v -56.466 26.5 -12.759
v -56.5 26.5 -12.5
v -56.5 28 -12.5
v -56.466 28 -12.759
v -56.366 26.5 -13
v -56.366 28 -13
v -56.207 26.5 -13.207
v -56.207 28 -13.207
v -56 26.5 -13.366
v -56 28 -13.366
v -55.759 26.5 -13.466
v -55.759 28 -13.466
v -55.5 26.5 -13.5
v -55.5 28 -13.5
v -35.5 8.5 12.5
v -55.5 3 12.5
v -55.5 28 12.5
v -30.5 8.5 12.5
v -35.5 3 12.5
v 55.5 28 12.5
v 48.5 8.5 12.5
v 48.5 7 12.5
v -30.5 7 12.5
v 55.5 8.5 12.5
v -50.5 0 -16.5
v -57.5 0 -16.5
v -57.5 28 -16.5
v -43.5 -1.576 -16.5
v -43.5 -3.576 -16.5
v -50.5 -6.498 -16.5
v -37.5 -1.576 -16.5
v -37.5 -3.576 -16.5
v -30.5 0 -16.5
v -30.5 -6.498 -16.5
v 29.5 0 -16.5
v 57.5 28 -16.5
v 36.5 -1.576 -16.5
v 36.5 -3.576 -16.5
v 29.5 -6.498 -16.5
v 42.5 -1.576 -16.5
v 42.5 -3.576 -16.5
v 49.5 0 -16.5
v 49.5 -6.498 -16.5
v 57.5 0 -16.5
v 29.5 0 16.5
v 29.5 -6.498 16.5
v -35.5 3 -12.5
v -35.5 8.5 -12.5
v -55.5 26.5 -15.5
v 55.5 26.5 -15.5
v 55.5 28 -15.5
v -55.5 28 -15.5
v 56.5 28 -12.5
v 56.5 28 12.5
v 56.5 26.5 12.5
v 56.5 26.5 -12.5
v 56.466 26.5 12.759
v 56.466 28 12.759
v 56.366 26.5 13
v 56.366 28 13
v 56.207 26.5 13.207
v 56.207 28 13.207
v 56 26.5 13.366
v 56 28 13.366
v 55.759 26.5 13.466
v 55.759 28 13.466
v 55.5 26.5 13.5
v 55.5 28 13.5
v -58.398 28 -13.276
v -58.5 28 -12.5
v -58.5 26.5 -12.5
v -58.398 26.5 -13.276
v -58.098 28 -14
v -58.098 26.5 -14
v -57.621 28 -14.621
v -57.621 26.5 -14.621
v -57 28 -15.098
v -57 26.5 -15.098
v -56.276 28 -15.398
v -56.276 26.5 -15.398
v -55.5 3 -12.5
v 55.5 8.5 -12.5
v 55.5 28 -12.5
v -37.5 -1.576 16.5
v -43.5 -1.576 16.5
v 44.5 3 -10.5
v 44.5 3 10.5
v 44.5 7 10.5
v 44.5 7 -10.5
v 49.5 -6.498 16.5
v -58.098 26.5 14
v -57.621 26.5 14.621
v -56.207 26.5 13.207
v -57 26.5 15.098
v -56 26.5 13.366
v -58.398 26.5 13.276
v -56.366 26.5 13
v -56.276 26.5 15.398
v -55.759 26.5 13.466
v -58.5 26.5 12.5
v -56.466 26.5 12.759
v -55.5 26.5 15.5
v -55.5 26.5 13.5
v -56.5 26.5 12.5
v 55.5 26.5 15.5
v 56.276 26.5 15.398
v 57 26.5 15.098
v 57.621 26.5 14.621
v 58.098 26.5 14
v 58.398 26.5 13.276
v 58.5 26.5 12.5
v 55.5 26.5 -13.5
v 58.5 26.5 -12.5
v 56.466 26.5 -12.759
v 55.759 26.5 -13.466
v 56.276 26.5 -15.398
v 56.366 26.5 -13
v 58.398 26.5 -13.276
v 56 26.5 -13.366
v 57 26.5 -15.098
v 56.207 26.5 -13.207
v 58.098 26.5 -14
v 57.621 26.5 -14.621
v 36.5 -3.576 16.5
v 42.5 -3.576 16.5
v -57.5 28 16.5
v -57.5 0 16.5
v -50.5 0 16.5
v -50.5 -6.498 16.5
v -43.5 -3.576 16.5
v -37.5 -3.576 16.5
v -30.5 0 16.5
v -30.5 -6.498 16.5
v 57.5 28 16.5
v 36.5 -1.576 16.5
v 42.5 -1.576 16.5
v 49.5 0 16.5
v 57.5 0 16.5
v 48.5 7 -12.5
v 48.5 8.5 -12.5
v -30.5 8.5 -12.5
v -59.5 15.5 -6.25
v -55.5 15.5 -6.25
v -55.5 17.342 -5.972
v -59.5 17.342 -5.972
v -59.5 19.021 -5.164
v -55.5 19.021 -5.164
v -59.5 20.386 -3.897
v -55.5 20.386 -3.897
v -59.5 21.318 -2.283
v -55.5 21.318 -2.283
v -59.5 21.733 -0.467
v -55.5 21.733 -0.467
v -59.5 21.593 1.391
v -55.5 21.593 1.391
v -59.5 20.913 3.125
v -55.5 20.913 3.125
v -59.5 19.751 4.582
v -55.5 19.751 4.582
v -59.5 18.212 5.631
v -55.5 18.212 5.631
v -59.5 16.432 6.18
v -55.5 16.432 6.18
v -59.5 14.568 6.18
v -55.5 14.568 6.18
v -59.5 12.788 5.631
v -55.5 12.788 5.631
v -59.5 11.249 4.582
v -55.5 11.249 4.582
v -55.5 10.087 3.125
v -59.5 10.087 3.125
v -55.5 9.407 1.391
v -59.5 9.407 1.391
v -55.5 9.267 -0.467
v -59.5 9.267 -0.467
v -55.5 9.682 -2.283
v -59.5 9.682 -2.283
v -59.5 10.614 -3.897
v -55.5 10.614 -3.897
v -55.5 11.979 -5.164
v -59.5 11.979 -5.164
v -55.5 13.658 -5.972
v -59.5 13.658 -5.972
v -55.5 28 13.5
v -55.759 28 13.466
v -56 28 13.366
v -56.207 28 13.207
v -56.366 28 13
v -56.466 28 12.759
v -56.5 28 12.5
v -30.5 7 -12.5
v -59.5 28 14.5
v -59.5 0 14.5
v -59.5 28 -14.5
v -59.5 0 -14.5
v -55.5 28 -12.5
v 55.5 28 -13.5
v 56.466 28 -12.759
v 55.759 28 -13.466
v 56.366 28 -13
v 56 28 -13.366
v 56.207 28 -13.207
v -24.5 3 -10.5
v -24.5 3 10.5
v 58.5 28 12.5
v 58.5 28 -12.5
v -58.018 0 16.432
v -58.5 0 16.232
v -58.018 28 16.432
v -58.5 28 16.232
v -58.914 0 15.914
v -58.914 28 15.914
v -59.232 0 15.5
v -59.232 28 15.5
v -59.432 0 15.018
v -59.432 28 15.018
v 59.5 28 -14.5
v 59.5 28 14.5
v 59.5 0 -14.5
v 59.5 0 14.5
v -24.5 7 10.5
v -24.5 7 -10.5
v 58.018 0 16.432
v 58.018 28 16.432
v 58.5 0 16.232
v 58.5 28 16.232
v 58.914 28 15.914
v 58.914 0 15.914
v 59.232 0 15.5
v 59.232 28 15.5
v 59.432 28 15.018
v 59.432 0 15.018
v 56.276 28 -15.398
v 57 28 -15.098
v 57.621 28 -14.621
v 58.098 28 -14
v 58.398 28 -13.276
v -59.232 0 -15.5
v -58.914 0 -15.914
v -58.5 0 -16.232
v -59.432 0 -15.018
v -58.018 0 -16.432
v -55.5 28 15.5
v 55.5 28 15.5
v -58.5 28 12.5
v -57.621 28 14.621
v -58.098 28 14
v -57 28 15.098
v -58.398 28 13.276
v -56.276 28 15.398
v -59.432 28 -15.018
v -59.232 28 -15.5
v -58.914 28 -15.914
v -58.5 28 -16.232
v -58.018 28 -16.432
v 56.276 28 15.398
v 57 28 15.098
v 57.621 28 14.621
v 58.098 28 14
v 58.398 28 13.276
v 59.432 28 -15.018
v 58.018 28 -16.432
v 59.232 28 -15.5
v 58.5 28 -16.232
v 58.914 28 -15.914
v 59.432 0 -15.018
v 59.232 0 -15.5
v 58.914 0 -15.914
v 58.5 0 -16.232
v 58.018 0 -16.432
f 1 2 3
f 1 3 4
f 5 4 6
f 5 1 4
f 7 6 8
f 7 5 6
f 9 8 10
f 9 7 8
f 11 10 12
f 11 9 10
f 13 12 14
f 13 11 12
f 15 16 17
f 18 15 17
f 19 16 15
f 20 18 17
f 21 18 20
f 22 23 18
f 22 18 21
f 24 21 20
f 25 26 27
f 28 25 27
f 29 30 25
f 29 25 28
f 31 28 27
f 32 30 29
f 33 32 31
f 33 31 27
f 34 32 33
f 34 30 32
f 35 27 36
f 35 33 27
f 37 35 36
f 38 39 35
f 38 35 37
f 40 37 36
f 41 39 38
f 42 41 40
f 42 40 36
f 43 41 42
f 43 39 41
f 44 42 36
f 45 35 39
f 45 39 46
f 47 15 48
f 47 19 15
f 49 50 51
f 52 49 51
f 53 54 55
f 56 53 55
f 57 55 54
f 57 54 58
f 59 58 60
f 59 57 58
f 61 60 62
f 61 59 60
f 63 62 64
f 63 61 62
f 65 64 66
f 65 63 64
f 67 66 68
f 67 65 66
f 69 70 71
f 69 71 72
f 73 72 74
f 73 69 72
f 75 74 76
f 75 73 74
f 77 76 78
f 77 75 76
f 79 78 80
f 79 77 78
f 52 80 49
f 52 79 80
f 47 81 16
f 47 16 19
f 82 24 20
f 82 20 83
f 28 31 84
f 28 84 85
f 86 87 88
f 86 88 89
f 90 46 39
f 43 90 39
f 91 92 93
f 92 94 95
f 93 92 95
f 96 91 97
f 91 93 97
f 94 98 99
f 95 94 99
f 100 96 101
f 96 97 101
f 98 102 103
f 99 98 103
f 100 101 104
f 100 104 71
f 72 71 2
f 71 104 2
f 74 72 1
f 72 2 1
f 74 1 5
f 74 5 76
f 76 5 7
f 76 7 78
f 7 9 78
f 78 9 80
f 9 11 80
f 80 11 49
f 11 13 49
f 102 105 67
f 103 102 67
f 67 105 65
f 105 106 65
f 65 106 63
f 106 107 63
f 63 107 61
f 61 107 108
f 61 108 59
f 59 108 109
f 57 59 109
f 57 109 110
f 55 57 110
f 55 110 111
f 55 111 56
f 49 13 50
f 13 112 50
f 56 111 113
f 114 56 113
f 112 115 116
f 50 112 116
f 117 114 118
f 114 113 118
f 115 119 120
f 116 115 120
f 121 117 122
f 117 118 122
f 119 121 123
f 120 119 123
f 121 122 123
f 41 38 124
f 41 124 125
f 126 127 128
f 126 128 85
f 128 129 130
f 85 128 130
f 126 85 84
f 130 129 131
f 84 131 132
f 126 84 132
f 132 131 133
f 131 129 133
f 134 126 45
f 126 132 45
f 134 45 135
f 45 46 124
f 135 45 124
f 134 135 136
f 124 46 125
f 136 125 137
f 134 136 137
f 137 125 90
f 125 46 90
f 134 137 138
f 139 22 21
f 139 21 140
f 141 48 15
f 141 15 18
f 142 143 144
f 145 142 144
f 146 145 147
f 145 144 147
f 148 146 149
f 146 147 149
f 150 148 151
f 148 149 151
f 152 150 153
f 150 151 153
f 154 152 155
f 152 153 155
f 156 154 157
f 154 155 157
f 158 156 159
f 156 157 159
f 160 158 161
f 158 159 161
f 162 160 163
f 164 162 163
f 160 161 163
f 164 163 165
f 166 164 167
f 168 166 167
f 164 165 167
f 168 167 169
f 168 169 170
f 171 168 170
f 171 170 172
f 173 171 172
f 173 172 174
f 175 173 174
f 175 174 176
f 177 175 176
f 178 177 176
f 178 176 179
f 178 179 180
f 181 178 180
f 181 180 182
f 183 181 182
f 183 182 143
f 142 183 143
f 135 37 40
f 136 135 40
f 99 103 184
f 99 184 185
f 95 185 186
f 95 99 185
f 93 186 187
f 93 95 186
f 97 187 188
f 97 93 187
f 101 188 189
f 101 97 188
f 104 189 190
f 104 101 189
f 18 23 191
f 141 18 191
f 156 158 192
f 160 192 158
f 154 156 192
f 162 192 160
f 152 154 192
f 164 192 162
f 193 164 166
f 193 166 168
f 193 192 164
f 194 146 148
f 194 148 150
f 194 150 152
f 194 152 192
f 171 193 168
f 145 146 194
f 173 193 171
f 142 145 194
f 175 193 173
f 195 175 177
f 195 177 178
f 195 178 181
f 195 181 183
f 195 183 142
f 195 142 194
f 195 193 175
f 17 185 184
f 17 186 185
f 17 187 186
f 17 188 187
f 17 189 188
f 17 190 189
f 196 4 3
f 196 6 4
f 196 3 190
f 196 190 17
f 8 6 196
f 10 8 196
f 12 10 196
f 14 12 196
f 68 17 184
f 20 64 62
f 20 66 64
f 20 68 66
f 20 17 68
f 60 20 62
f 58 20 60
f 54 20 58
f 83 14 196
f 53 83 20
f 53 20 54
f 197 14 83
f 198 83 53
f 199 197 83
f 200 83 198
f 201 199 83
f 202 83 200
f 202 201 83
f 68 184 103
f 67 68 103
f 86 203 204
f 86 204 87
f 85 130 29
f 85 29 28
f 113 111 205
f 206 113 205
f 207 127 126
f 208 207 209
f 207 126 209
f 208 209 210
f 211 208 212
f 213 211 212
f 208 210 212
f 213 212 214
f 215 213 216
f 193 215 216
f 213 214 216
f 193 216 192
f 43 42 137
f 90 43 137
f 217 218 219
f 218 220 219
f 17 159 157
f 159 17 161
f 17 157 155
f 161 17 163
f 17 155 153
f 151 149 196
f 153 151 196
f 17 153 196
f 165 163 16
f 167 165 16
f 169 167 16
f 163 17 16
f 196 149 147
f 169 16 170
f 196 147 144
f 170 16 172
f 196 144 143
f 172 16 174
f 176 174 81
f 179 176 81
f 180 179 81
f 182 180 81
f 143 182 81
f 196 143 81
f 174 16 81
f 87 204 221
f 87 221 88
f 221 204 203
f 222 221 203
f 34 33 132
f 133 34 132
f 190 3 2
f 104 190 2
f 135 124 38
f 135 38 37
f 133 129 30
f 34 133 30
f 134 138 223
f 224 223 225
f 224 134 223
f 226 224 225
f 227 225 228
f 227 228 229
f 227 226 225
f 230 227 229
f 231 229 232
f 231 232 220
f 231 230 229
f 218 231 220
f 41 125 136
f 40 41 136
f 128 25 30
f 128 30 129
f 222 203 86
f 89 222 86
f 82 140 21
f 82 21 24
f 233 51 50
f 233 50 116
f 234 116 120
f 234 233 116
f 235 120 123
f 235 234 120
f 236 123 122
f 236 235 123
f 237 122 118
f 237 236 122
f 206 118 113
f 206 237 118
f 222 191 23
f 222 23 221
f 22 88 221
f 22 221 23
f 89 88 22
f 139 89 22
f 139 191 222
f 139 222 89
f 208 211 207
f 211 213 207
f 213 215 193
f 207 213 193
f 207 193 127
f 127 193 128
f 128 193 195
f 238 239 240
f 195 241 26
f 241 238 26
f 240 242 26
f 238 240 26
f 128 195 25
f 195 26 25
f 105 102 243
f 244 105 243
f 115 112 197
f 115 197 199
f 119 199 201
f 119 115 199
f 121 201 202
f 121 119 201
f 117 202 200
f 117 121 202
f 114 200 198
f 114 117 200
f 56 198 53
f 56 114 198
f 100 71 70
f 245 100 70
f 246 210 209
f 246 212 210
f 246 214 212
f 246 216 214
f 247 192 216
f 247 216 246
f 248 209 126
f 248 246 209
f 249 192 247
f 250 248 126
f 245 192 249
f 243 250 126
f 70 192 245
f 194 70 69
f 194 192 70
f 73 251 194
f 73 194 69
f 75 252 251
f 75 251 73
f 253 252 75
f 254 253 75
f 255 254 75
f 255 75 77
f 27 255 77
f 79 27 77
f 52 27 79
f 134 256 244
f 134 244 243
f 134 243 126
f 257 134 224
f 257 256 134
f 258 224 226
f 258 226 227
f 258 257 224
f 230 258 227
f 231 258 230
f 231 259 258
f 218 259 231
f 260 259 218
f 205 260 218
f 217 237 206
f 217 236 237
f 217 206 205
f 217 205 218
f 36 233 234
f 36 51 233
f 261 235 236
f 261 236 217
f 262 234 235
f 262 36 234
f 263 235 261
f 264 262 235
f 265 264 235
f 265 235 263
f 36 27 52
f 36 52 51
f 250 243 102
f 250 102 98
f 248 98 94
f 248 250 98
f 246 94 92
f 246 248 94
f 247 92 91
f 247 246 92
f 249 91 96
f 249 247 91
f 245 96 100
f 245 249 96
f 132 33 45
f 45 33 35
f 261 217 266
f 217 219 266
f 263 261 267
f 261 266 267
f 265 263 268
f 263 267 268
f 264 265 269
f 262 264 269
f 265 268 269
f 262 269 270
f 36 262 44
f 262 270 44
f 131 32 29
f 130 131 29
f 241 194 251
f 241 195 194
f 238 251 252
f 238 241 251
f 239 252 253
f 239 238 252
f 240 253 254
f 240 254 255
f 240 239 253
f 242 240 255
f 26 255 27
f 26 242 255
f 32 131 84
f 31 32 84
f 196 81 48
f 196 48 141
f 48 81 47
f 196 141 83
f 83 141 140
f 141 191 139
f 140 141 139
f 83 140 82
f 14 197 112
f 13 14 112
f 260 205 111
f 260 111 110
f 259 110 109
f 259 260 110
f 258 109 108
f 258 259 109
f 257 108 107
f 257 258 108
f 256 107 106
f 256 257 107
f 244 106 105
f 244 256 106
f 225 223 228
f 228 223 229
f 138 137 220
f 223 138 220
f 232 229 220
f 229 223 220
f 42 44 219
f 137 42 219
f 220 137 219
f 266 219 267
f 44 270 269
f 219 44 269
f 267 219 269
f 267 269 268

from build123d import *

# Parameters (mm, degrees)
SZKIC5_W                    = 119
SZKIC5_H                    = 33
DODANIE_WYCI_GNI_CIE3_DEPTH = 3
SZKIC6_W                    = 119
SZKIC6_H                    = 33
SZKIC6_W_2                  = 111
SZKIC6_H_2                  = 25
DODANIE_WYCI_GNI_CIE4_DEPTH = 25
SZKIC7_W                    = 91
SZKIC7_H                    = 25
SZKIC7_W_2                  = 69
SZKIC7_H_2                  = 21
DODANIE_WYCI_GNI_CIE5_DEPTH = 4
SZKIC8_W                    = 5
SZKIC8_H                    = 25
SZKIC8_W_2                  = 7
DODANIE_WYCI_GNI_CIE6_DEPTH = 1.5
SZKIC10_R                   = 6.25
WYTNIJ_WYCI_GNI_CIE1_DEPTH  = 7.5
SZKIC22_W                   = 2
SZKIC22_H                   = 3
BOSS_EXTRUDE2_DEPTH         = 20
FILLET1_R                   = 2
SKETCH2_W                   = 6
SKETCH2_H                   = 2
CUT_EXTRUDE1_DEPTH          = 33
FILLET2_R                   = 2
FILLET3_R                   = 2
CUT_EXTRUDE2_DEPTH          = 111


with BuildPart() as part:
    # Szkic5 → Dodanie-wyciągnięcie3 (new body)
    with BuildSketch(Plane(origin=(0, 0, 0), x_dir=(1, 0, 0), z_dir=(0, 1, 0))):
        Rectangle(SZKIC5_W, SZKIC5_H)
    extrude(amount=DODANIE_WYCI_GNI_CIE3_DEPTH)

    # Szkic6 → Dodanie-wyciągnięcie4 (add)
    with BuildSketch(Plane(origin=(0, 3, 0), x_dir=(1, 0, 0), z_dir=(0, 1, 0))):
        Rectangle(SZKIC6_W, SZKIC6_H)
        Rectangle(SZKIC6_W_2, SZKIC6_H_2, mode=Mode.SUBTRACT)
    extrude(amount=DODANIE_WYCI_GNI_CIE4_DEPTH)

    # Szkic7 → Dodanie-wyciągnięcie5 (add)
    with BuildSketch(Plane(origin=(0, 3, 0), x_dir=(1, 0, 0), z_dir=(0, 1, 0))):
        with Locations((10, 0)):
            Rectangle(SZKIC7_W, SZKIC7_H)
        with Locations((10, 0)):
            Rectangle(SZKIC7_W_2, SZKIC7_H_2, mode=Mode.SUBTRACT)
    extrude(amount=DODANIE_WYCI_GNI_CIE5_DEPTH)

    # Szkic8 → Dodanie-wyciągnięcie6 (add)
    with BuildSketch(Plane(origin=(0, 7, 0), x_dir=(1, 0, 0), z_dir=(0, 1, 0))):
        with Locations((-33, 0)):
            Rectangle(SZKIC8_W, SZKIC8_H)
        with Locations((52, 0)):
            Rectangle(SZKIC8_W_2, SZKIC8_H)
    extrude(amount=DODANIE_WYCI_GNI_CIE6_DEPTH)

    # Szkic10 → Wytnij-wyciągnięcie1 (cut)
    with BuildSketch(Plane(origin=(-55.5, 0, 0), x_dir=(0, 0, -1), z_dir=(1, 0, 0))):
        with Locations((0, 15.5)):
            Circle(SZKIC10_R)
    extrude(amount=-WYTNIJ_WYCI_GNI_CIE1_DEPTH, mode=Mode.SUBTRACT)

    # Wycięcie-wyciągnięcie po ścieżce1: sweep along a path in Szkic21
    with BuildLine(Plane(origin=(0, 28, 0), x_dir=(1, 0, 0), z_dir=(0, 1, 0))) as wyci_cie_wyci_gni_cie_po_cie_ce1_path:
        Line((-55.5, 14.5), (55.5, 14.5))
        ThreePointArc((55.5, 14.5), (56.914213562, 13.914213562), (57.5, 12.5))
        Line((57.5, 12.5), (57.5, -12.5))
        ThreePointArc((57.5, -12.5), (56.914213562, -13.914213562), (55.5, -14.5))
        Line((55.5, -14.5), (-55.5, -14.5))
        ThreePointArc((-55.5, -14.5), (-56.914213562, -13.914213562), (-57.5, -12.5))
        Line((-57.5, -12.5), (-57.5, 12.5))
        ThreePointArc((-57.5, 12.5), (-56.914213562, 13.914213562), (-55.5, 14.5))
    # Szkic22 → Wycięcie-wyciągnięcie po ścieżce1 (sweep, cut)
    with BuildSketch(Plane(origin=(49.5, 0, 0), x_dir=(0, 0, -1), z_dir=(1, 0, 0))):
        with Locations((14.5, 28)):
            Rectangle(SZKIC22_W, SZKIC22_H)
    sweep(path=wyci_cie_wyci_gni_cie_po_cie_ce1_path.line, mode=Mode.SUBTRACT)

    # Sketch1 → Boss-Extrude2 (add)
    with BuildSketch(Plane(origin=(49.5, 0, 0), x_dir=(0, 0, -1), z_dir=(1, 0, 0))):
        with BuildLine():
            Line((-16.5, 0), (16.5, 0))
            Line((16.5, 0), (16.5, -9))
            Line((16.5, -9), (17.83044843, -12))
            Line((17.83044843, -12), (18, -18.997946289))
            Line((18, -18.997946289), (12.5, -18.997946289))
            ThreePointArc((12.5, -18.997946289), (0, -6.497946289), (-12.5, -18.997946289))
            Line((-12.5, -18.997946289), (-18, -18.997946289))
            Line((-18, -18.997946289), (-17.83044843, -12))
            Line((-17.83044843, -12), (-16.5, -9))
            Line((-16.5, -9), (-16.5, 0))
        make_face()
    boss_extrude2 = extrude(amount=-BOSS_EXTRUDE2_DEPTH)

    # Fillet1
    fillet1_edges = [part.edges().sort_by_distance(p)[0] for p in [
        (39.5, -12, -17.83044843),
        (39.5, -18.997946289, -18),
        (39.5, -18.997946289, 18),
        (39.5, -12, 17.83044843),
        (39.5, -9, 16.5),
        (39.5, -9, -16.5),
    ]]
    fillet(fillet1_edges, radius=FILLET1_R)

    # Sketch2 → Cut-Extrude1 (cut)
    with BuildSketch(Plane.XY.offset(16.5)):
        with Locations((39.5, -2.576410505)):
            Rectangle(SKETCH2_W, SKETCH2_H)
    cut_extrude1 = extrude(amount=-CUT_EXTRUDE1_DEPTH, mode=Mode.SUBTRACT)

    # Mirror1: Boss-Extrude2 across plane
    add(boss_extrude2.mirror(Plane(origin=(-0.5, 0, 0), x_dir=(0, 0, 1), z_dir=(1, 0, 0))))

    # Mirror4: Cut-Extrude1 across plane
    add(cut_extrude1.mirror(Plane(origin=(-0.5, 0, 0), x_dir=(0, 0, 1), z_dir=(1, 0, 0))), mode=Mode.SUBTRACT)

    # Fillet2
    fillet2_edges = [part.edges().sort_by_distance(p)[0] for p in [
        (-40.5, -18.997946289, -18),
        (-40.5, -12, -17.83044843),
        (-40.5, -9, -16.5),
        (-40.5, -9, 16.5),
        (-40.5, -12, 17.83044843),
        (-40.5, -18.997946289, 18),
    ]]
    fillet(fillet2_edges, radius=FILLET2_R)

    # Fillet3
    fillet3_edges = [part.edges().sort_by_distance(p)[0] for p in [
        (59.5, 14, 16.5),
        (-59.5, 14, 16.5),
        (-59.5, 14, -16.5),
        (59.5, 14, -16.5),
    ]]
    fillet(fillet3_edges, radius=FILLET3_R)

    # Sketch3 → Cut-Extrude2 (cut, through all)
    with BuildSketch(Plane.ZY.offset(50.5)):
        Polygon((0, -6.497946289), (29.072487689, -6.497946289), (29.072487689, -24.547767437), (-22.707347074, -24.547767437), (-22.707347074, -6.497946289), align=None)
    extrude(amount=-CUT_EXTRUDE2_DEPTH, mode=Mode.SUBTRACT)


solid = part.part
